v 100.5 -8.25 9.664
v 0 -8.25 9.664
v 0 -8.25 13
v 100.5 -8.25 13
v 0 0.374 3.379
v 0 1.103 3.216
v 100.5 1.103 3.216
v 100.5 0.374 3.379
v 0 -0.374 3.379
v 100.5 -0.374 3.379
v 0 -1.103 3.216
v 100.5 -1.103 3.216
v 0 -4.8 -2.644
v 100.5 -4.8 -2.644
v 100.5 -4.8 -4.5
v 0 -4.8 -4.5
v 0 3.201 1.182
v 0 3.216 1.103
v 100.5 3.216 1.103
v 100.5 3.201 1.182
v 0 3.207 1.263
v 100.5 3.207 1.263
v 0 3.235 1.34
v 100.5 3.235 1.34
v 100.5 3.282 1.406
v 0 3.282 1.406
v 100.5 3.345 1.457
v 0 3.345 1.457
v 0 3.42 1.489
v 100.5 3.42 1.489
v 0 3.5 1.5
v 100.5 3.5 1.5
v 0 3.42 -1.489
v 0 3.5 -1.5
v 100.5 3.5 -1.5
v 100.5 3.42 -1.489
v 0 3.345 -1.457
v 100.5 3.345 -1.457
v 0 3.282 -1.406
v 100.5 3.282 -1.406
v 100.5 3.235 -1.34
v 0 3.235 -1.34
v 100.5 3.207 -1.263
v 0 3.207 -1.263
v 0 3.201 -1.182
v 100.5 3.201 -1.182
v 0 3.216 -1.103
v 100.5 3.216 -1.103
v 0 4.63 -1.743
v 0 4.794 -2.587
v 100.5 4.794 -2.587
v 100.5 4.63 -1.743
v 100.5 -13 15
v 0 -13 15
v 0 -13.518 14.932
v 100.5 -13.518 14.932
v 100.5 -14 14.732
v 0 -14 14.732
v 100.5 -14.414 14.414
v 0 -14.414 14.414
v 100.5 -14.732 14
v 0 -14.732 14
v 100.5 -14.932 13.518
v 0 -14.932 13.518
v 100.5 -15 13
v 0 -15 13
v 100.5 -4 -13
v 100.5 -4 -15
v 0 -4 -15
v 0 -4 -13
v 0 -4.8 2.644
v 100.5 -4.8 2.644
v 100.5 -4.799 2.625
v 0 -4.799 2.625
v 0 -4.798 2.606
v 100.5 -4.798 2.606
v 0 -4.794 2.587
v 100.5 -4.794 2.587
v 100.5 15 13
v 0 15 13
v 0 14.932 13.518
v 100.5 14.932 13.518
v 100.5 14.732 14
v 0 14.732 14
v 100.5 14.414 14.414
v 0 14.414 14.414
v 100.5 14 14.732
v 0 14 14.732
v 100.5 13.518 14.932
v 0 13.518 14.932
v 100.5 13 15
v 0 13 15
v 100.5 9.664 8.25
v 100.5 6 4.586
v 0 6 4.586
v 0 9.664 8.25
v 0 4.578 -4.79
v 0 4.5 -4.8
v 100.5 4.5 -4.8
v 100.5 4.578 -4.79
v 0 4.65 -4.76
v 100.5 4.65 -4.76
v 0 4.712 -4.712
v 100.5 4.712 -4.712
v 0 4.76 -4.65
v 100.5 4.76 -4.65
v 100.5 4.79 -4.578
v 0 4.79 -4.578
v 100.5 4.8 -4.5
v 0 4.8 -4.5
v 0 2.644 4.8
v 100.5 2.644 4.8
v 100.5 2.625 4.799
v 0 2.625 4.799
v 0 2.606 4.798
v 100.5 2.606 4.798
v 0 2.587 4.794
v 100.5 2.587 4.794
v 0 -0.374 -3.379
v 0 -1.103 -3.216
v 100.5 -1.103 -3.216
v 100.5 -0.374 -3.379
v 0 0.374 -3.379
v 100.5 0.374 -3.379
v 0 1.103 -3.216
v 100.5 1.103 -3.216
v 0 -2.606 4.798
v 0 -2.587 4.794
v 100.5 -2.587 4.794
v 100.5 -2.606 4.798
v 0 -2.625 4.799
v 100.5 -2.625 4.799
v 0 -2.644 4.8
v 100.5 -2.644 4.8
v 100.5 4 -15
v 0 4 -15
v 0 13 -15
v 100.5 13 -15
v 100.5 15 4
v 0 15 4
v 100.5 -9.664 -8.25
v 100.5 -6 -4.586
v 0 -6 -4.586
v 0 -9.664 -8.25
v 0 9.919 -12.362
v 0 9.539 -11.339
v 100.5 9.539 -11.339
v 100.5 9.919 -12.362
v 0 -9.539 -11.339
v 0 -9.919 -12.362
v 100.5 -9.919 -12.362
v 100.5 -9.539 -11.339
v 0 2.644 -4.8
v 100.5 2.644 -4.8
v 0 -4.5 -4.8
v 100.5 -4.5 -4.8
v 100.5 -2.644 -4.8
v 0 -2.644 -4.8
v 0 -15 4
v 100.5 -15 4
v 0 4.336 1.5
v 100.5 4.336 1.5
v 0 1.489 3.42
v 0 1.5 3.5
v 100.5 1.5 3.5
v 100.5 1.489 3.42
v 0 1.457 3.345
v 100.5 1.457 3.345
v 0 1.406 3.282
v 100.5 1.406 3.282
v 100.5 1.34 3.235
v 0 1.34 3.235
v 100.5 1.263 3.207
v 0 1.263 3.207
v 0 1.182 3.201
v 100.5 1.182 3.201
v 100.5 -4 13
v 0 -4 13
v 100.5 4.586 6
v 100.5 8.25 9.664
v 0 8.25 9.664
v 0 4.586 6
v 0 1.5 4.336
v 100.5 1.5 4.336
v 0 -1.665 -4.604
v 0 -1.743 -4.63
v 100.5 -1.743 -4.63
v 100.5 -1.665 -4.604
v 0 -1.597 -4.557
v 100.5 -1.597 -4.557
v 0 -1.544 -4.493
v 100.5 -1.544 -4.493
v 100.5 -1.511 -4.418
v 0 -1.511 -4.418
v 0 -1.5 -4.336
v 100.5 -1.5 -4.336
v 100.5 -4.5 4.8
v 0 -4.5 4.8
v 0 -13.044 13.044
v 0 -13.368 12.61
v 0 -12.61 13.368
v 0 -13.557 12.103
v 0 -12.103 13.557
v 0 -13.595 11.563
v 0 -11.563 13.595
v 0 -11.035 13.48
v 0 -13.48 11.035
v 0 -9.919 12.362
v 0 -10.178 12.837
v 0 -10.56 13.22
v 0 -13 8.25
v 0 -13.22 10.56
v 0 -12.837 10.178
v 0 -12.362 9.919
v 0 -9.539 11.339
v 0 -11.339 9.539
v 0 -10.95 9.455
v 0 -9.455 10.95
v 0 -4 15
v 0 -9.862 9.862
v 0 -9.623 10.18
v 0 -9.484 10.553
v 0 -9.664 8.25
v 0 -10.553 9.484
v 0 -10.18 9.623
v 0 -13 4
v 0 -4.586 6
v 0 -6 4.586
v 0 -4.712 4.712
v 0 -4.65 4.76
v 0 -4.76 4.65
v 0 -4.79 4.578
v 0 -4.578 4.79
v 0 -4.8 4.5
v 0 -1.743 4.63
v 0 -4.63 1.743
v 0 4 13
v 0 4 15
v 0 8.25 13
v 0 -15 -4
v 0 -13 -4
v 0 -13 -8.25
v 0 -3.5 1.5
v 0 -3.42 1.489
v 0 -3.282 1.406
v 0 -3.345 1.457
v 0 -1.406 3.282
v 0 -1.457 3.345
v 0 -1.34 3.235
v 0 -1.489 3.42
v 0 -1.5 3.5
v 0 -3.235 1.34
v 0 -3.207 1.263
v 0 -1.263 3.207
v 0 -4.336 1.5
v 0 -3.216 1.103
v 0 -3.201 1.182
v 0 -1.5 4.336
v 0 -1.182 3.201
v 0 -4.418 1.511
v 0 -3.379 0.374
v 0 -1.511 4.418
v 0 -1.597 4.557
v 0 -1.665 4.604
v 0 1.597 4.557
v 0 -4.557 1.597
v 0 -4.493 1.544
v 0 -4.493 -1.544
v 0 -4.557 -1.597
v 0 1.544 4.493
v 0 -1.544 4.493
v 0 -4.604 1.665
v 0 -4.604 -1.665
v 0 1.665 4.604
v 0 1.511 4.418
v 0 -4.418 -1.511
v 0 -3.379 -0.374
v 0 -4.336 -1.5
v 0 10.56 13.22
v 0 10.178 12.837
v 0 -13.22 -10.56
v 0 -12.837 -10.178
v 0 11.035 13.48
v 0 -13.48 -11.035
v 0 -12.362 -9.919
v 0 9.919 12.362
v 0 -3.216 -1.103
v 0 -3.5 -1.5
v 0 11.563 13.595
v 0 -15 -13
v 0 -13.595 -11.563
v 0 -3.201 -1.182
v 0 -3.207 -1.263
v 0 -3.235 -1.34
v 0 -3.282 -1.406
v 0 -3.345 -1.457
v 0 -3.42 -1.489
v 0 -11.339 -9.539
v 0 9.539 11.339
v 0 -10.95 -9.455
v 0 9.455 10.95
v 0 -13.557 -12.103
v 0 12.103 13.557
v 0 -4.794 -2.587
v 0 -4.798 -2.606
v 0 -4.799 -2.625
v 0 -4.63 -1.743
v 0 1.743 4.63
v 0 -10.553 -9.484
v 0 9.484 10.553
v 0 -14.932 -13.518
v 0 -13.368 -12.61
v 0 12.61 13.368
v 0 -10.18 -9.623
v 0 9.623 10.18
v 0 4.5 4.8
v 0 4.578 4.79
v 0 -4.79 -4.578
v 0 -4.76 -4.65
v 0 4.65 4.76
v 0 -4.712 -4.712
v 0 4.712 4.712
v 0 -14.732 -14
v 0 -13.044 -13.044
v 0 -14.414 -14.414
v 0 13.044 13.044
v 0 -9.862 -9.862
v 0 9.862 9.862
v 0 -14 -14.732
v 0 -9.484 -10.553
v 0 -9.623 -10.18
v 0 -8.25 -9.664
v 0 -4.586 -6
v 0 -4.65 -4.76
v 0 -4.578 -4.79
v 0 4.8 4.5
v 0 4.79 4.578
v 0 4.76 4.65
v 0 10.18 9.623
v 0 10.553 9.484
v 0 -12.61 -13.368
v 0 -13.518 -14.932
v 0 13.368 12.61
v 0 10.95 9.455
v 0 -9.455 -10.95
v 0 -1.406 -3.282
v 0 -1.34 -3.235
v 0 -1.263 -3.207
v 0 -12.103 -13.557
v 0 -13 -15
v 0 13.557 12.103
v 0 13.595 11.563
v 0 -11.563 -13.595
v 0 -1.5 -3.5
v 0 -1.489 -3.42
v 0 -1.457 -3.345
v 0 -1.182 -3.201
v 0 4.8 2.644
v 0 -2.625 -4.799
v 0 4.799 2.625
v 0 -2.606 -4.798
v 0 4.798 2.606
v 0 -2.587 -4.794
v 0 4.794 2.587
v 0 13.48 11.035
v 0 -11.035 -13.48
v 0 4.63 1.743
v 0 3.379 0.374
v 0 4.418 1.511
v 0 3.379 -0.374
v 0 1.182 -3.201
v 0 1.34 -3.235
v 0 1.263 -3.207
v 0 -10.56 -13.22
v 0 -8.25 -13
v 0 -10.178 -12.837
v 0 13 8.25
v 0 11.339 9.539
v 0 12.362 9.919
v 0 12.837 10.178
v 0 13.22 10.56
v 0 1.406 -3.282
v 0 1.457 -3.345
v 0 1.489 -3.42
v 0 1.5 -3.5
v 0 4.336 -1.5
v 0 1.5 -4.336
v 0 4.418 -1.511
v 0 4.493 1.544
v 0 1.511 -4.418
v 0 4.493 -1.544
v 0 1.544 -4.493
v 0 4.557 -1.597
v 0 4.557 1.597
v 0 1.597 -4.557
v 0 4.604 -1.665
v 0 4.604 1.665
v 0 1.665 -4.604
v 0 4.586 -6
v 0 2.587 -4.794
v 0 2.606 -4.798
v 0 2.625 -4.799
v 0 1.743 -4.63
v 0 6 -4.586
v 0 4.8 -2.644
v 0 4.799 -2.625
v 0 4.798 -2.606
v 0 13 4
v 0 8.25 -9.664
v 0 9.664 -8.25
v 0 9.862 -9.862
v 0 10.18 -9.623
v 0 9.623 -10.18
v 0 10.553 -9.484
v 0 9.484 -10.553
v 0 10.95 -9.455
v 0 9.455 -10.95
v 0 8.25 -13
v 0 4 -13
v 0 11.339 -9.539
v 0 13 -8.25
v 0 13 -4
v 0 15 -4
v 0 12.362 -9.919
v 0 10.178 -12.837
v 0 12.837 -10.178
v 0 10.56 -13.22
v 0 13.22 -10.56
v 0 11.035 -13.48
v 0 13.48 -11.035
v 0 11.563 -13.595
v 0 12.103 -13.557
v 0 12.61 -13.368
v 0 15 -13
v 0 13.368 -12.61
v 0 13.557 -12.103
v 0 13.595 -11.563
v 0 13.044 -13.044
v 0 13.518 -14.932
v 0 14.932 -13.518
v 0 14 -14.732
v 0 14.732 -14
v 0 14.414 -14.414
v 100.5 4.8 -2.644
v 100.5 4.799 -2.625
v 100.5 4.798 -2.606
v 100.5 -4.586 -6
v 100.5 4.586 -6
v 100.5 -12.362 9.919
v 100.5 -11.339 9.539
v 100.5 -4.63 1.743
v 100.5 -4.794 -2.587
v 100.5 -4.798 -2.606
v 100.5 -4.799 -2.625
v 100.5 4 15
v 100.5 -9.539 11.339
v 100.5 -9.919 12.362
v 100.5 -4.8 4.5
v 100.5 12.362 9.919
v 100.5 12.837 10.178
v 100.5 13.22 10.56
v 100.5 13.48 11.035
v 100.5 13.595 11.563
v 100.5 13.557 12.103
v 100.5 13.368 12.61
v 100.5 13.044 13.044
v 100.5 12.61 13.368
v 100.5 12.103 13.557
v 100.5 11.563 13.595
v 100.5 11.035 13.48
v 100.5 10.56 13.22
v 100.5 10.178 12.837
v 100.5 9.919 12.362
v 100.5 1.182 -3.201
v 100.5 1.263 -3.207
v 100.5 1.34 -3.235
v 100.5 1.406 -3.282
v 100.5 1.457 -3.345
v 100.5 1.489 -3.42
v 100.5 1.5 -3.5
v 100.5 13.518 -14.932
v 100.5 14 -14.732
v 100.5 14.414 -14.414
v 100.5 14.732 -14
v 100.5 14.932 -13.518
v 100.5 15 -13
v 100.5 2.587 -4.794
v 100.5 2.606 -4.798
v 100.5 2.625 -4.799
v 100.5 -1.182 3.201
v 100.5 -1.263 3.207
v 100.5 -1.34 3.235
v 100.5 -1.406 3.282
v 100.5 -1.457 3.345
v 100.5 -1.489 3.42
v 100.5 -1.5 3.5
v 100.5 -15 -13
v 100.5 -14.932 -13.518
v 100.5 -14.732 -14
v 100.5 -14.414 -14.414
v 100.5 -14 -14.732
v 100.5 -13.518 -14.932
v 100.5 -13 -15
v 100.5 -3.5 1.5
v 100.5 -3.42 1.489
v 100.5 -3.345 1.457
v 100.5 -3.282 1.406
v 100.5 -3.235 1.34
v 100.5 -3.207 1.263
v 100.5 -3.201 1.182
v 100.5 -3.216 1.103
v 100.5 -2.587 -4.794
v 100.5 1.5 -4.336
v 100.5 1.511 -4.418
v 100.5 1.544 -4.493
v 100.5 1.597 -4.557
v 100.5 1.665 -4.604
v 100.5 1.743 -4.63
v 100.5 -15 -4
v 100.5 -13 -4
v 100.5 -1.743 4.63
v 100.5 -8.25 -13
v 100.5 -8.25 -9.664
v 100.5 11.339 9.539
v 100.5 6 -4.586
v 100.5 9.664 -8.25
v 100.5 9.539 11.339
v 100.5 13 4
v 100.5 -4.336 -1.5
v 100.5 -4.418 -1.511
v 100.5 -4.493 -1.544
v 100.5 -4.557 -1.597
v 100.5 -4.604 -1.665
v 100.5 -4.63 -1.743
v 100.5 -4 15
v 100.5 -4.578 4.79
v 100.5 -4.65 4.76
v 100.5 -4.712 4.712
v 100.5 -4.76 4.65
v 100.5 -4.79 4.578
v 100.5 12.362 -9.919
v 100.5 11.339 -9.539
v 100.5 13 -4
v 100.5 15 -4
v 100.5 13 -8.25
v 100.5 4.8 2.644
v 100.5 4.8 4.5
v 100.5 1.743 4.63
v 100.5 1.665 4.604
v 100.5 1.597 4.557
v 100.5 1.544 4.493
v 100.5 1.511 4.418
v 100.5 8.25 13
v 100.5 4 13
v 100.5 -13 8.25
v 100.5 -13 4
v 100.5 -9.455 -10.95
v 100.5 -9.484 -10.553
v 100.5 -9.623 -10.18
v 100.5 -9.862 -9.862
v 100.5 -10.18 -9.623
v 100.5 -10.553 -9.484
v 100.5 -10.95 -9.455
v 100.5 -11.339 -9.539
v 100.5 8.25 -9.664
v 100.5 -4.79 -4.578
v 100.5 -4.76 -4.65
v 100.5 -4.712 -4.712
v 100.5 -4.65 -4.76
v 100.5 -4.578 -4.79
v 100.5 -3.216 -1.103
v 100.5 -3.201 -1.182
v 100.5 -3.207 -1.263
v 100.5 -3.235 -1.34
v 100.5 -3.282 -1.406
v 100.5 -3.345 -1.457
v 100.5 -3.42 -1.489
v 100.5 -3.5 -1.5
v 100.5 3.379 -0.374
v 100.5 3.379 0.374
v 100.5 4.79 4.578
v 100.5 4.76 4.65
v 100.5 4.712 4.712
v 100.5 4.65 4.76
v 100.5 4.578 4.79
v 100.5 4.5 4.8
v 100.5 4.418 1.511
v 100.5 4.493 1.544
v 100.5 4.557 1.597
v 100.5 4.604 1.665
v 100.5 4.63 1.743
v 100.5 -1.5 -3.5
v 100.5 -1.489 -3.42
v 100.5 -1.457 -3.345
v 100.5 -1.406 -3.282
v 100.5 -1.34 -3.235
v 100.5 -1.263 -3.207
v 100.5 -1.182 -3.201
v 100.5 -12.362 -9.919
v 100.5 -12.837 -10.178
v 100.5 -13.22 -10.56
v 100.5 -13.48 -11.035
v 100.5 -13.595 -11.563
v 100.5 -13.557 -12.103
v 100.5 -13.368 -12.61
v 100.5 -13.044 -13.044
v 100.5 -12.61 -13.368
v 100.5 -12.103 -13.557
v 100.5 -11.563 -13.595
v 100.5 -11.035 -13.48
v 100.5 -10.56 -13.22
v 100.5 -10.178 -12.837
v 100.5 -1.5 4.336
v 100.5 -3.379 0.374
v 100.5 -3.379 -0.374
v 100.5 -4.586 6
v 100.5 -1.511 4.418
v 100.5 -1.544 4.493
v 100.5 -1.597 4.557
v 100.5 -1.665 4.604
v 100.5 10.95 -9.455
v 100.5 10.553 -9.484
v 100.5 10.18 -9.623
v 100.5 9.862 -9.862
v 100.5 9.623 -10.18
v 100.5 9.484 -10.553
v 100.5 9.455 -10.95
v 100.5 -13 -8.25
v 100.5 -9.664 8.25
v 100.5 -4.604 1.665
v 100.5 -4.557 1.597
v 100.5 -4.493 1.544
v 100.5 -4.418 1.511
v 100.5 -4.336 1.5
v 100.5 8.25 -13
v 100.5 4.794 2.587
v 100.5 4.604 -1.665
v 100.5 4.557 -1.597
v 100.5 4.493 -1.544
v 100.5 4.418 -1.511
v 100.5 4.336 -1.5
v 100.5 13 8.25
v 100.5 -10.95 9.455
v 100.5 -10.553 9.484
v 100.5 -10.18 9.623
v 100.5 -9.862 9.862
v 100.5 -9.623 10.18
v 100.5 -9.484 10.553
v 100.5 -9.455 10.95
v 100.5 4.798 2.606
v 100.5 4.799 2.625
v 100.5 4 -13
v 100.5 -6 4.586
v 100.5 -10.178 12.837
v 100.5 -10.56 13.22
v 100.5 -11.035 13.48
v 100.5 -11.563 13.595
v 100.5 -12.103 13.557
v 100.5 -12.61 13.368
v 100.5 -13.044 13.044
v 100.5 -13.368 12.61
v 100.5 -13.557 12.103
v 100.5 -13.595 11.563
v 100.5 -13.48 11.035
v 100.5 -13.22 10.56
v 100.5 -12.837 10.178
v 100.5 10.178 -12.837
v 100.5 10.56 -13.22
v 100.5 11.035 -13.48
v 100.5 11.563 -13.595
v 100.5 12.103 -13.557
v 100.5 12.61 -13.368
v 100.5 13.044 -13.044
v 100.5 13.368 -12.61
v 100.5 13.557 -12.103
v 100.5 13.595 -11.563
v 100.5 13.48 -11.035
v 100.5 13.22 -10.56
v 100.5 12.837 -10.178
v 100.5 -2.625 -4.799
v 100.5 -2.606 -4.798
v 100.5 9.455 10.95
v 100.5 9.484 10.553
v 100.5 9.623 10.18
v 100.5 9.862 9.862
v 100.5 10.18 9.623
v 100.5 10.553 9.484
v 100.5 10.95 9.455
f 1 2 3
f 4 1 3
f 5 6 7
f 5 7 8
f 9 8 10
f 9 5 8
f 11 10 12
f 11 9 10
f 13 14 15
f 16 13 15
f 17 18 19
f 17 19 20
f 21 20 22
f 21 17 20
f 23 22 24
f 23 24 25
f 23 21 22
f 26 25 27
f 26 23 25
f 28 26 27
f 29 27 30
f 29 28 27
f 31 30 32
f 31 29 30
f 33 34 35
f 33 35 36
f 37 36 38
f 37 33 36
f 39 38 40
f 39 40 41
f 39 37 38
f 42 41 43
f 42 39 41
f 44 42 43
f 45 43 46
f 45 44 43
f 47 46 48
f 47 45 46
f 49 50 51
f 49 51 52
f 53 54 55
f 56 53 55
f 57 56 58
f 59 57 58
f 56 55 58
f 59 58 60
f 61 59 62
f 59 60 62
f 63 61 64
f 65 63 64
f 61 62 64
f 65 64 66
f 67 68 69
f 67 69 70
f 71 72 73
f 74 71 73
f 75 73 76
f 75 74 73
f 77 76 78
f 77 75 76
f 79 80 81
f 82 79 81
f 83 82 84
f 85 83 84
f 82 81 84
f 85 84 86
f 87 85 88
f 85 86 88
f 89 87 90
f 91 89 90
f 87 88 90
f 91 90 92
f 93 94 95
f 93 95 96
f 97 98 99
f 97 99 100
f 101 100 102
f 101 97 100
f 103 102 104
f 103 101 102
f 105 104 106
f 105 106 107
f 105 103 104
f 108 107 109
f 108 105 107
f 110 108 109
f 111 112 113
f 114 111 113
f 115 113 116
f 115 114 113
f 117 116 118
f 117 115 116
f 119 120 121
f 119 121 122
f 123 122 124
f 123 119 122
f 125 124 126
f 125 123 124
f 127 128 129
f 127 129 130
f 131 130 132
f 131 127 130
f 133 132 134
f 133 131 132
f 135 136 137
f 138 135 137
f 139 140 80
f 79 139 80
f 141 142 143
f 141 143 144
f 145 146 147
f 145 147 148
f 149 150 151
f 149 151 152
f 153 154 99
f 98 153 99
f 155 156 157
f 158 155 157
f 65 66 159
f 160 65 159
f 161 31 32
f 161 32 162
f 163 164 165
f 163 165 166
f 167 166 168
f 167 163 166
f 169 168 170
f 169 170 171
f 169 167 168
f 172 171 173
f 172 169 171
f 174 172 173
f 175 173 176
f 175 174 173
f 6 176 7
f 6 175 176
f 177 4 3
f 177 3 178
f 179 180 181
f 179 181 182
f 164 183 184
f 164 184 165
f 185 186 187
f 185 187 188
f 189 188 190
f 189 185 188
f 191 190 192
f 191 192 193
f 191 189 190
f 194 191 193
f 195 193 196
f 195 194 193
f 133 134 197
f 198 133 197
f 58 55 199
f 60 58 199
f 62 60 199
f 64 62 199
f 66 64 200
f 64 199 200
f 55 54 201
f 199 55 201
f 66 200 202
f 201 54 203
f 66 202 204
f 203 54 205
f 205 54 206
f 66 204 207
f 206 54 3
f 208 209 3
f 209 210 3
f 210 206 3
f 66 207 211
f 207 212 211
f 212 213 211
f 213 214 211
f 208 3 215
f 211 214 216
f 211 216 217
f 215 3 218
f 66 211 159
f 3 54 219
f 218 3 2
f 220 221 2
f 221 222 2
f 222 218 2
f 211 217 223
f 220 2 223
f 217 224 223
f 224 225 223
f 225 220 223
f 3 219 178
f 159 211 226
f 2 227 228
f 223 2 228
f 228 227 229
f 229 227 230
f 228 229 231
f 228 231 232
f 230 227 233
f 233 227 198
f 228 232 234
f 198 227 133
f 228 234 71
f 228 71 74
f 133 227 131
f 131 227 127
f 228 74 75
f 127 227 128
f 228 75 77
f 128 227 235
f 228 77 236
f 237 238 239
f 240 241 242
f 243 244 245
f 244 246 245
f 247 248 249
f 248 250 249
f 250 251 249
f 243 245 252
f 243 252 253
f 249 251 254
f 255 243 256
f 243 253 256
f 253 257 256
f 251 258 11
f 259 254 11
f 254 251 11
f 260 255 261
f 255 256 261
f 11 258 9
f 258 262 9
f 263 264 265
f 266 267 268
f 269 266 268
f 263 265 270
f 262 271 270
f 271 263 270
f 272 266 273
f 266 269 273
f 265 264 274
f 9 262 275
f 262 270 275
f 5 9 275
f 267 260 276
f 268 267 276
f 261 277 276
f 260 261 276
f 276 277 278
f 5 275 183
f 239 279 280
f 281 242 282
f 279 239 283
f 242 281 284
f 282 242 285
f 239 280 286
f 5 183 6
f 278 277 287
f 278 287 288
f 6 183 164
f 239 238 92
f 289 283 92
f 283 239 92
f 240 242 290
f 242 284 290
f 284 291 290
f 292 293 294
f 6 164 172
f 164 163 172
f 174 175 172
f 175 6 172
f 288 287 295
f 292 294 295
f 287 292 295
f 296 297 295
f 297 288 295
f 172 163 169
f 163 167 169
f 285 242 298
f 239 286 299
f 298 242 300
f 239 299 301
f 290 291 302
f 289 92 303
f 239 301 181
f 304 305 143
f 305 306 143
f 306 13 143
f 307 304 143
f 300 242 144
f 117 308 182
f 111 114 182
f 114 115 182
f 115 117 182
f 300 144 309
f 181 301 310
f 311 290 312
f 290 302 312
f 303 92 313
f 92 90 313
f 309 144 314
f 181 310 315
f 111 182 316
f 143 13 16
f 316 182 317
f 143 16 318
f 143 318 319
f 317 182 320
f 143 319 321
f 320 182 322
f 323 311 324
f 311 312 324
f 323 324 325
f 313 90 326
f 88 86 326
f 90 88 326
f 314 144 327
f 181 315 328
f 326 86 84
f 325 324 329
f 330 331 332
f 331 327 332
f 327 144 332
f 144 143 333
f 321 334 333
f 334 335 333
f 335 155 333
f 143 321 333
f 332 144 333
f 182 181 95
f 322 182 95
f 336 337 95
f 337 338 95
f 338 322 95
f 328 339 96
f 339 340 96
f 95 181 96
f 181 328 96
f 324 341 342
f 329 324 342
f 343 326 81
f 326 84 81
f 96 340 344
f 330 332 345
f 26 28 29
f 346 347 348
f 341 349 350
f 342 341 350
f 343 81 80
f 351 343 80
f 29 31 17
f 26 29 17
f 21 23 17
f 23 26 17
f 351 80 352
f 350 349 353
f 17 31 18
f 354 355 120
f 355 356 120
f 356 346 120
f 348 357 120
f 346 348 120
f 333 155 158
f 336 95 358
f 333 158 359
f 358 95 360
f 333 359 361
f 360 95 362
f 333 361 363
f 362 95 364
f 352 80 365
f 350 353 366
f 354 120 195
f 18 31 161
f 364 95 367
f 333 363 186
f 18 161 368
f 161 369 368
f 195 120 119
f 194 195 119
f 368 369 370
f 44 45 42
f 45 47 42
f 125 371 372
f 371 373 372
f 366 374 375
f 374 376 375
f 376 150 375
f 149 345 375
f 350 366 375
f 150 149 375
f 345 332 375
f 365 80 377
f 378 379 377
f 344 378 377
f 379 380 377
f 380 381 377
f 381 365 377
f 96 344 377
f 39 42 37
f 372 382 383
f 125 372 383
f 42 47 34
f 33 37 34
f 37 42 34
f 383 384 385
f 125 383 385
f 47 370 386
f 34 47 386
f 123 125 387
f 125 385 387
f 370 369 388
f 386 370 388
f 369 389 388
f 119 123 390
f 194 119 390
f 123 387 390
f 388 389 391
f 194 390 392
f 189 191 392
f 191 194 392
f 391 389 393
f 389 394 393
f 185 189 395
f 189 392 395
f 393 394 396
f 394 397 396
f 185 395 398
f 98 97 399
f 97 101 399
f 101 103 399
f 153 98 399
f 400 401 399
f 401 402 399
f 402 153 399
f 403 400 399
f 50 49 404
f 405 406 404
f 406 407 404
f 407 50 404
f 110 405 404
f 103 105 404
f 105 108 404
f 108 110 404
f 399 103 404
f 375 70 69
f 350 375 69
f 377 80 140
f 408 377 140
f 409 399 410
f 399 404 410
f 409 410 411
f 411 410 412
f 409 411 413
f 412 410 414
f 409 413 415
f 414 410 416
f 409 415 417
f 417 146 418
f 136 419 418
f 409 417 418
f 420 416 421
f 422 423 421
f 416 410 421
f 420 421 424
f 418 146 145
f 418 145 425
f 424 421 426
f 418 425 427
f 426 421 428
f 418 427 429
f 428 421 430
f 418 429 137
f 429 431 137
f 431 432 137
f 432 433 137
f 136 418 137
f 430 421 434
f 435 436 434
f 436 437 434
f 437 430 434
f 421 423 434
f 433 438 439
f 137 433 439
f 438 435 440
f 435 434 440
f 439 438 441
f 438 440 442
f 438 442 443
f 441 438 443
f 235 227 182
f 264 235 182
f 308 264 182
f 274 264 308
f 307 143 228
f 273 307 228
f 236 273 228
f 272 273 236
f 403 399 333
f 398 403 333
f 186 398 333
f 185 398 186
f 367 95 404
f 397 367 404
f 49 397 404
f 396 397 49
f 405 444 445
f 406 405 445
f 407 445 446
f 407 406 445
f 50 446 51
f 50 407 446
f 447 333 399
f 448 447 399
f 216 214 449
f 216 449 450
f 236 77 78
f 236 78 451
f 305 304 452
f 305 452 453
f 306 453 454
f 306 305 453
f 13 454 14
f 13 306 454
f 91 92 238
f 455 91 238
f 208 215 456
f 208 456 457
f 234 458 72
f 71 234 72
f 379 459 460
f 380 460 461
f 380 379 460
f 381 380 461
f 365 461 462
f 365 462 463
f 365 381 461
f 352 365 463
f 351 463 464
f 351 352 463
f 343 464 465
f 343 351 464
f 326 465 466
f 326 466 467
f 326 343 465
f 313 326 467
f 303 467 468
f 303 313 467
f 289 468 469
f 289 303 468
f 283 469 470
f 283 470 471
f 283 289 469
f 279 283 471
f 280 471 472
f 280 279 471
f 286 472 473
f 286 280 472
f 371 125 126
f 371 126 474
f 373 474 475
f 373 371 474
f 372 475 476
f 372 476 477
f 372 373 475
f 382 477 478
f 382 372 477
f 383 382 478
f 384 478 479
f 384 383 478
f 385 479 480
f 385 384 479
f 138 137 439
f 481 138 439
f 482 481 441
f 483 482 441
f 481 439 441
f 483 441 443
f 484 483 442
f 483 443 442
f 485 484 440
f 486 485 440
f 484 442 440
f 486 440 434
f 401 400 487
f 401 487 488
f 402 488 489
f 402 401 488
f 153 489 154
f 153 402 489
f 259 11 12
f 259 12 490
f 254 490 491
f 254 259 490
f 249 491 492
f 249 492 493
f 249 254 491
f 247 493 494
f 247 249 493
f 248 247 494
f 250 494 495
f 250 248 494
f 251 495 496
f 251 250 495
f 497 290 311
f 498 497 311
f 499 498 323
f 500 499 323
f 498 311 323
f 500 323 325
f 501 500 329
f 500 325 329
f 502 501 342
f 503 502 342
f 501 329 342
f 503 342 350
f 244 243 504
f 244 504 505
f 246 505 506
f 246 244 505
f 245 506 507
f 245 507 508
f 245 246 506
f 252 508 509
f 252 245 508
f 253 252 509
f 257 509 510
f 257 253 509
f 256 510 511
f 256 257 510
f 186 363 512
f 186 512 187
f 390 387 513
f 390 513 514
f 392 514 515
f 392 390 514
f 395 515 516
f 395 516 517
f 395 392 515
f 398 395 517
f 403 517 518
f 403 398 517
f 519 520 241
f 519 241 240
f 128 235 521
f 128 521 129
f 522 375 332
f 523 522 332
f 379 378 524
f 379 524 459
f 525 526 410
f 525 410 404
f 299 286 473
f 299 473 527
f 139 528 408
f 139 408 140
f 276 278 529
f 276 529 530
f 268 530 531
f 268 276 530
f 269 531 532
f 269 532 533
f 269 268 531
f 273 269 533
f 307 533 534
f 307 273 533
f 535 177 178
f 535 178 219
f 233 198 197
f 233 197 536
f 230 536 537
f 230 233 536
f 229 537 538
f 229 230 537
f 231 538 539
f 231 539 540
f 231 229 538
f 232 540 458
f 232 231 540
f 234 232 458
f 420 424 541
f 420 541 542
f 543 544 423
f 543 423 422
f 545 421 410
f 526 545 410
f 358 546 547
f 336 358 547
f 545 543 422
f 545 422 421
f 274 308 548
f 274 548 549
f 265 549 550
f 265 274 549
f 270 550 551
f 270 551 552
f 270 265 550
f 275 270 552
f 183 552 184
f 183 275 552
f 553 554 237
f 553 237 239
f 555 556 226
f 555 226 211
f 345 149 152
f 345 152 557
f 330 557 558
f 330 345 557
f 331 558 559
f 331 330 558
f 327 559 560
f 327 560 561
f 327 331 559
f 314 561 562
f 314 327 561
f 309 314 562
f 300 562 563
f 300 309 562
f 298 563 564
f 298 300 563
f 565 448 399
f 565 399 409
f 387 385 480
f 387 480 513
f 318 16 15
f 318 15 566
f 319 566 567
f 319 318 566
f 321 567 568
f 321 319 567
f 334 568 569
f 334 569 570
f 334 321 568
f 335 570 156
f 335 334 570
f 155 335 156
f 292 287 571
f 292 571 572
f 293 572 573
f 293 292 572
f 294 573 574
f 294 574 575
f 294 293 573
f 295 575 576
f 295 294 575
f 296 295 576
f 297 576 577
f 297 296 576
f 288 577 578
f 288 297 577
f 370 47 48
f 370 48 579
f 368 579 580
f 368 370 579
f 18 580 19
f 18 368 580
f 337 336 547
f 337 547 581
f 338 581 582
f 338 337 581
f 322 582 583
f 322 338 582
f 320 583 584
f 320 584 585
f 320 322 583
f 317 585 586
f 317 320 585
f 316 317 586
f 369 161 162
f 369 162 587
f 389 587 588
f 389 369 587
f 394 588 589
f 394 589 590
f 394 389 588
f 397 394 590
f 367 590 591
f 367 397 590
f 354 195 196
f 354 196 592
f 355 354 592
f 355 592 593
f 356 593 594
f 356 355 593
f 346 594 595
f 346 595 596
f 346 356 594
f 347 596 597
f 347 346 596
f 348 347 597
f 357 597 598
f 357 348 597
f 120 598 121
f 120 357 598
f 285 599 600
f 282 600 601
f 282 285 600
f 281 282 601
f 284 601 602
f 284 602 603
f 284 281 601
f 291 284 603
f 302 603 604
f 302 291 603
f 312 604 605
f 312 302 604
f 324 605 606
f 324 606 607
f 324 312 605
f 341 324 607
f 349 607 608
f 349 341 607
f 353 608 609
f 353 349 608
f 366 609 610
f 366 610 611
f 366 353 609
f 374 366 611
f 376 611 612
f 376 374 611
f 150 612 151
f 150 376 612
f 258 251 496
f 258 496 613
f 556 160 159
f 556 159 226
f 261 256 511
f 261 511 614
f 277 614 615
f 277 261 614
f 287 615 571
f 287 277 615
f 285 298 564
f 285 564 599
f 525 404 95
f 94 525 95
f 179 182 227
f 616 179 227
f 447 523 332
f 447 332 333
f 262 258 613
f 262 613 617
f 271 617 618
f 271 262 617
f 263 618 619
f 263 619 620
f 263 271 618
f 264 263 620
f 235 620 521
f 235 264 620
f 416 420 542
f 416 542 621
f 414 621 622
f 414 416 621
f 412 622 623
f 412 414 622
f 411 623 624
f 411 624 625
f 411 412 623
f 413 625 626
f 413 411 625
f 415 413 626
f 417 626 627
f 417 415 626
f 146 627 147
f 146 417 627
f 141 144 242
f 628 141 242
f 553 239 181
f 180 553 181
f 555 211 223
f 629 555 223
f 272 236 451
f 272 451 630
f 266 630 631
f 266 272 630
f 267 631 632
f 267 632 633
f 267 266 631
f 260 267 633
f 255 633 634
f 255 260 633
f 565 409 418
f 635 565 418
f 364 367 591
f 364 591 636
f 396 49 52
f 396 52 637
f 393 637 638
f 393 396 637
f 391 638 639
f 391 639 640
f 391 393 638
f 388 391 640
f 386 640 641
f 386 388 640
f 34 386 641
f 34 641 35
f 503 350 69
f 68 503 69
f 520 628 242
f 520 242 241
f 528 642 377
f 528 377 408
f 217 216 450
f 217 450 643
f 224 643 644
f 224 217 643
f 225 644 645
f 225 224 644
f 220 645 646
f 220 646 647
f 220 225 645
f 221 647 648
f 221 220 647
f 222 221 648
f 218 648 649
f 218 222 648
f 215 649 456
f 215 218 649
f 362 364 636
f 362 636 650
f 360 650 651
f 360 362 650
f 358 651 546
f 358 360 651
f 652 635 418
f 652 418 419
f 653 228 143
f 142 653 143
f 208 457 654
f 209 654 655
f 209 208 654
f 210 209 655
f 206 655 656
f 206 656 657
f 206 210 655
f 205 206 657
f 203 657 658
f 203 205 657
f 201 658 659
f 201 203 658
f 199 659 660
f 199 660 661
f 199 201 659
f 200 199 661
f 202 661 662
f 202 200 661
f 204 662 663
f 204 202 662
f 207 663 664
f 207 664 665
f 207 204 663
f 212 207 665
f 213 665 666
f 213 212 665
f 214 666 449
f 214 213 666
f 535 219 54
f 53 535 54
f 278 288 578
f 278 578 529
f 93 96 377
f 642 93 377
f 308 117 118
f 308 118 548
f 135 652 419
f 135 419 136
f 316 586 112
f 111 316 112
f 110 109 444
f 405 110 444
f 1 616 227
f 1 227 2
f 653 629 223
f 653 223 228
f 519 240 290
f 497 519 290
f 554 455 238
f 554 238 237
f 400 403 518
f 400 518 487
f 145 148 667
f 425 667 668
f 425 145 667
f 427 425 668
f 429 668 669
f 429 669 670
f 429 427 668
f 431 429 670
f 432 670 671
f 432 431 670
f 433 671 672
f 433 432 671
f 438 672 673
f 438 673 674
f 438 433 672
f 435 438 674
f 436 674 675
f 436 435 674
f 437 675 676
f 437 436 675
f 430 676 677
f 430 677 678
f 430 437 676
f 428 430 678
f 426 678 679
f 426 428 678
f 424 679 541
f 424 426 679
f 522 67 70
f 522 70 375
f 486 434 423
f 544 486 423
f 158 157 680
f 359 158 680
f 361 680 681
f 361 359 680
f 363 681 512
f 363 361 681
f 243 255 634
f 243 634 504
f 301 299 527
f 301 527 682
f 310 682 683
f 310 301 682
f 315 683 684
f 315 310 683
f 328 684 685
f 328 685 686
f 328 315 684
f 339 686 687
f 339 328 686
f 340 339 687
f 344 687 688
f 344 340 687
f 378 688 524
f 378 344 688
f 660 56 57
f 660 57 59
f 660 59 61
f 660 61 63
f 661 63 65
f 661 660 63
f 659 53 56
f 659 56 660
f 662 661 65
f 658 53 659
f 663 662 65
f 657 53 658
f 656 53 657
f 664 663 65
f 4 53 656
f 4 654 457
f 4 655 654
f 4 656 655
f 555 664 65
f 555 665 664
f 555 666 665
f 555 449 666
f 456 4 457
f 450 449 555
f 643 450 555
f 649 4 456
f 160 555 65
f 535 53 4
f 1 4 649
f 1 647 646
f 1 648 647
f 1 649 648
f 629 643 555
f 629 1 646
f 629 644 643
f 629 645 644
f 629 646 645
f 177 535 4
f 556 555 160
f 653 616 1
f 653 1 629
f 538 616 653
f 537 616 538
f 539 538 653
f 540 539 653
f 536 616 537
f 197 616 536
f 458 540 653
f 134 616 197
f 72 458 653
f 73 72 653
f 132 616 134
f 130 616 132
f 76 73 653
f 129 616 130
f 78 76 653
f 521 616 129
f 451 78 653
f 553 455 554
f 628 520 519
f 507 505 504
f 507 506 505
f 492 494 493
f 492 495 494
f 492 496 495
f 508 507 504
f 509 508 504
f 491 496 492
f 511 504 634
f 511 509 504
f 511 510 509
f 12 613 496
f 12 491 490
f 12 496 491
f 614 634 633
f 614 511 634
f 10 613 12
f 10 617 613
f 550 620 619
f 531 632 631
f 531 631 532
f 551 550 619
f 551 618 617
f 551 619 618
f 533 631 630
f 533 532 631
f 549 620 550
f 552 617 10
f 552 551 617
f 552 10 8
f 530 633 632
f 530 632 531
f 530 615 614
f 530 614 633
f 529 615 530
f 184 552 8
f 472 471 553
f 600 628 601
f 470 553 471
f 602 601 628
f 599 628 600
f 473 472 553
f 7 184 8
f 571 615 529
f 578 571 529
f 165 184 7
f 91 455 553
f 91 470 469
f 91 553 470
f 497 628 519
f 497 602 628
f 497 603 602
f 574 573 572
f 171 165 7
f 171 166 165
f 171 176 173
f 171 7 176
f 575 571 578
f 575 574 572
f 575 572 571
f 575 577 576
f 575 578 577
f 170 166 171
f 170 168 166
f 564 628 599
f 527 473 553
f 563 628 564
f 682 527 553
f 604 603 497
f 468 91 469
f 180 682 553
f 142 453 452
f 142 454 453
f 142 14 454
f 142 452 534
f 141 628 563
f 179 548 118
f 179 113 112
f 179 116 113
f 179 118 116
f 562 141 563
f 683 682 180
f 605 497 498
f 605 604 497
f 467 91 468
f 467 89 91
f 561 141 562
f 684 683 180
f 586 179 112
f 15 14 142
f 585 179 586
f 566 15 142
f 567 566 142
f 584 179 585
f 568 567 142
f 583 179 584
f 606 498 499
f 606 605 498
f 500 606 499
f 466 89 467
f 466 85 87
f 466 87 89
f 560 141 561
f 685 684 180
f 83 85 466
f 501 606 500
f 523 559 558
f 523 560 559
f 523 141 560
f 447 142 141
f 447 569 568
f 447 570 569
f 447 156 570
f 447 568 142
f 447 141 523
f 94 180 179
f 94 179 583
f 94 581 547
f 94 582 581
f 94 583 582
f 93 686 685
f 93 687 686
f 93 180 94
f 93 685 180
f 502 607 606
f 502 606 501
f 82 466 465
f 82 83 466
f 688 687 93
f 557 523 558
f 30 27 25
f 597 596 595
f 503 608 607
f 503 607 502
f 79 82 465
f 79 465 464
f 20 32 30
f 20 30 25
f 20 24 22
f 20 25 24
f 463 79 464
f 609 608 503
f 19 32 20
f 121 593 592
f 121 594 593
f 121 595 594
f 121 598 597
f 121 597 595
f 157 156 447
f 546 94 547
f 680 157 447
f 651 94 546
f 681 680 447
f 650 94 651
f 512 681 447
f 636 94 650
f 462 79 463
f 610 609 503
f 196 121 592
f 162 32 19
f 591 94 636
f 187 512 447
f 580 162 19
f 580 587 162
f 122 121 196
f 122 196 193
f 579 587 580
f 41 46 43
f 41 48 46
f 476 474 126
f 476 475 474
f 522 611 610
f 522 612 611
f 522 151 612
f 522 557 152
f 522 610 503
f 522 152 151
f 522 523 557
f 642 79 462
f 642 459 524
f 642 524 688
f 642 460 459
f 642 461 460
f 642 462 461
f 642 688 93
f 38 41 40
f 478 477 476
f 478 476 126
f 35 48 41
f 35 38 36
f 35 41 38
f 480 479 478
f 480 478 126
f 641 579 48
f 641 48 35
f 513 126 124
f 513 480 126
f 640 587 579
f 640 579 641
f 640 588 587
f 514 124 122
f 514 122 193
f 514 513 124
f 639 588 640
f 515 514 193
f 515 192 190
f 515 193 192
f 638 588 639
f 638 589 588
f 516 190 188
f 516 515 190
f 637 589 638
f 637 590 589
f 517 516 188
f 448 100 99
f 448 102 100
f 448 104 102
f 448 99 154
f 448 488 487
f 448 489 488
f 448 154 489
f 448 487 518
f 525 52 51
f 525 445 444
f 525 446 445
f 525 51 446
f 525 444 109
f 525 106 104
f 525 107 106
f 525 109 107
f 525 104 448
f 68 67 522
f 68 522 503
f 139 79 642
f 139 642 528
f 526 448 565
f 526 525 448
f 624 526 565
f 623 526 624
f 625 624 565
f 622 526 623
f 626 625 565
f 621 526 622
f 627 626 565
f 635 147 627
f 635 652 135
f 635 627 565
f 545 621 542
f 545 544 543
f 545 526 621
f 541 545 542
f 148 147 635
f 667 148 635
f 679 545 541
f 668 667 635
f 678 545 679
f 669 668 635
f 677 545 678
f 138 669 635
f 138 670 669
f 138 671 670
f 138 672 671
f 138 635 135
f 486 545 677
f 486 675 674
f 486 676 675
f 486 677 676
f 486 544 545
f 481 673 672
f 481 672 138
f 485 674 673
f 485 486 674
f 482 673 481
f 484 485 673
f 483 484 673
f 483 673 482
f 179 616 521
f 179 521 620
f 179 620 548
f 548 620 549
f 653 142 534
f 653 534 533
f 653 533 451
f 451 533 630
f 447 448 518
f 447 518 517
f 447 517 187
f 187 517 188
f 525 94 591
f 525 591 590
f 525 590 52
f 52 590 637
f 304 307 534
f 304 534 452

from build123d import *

# Parameters (mm, degrees)
BOSS_EXTRUDE1_DEPTH = 100.5


with BuildPart() as part:
    # Sketch1 → Boss-Extrude1 (new body)
    with BuildSketch(Plane(origin=(0, 0, 0), x_dir=(0, 0, -1), z_dir=(1, 0, 0))):
        with BuildLine():
            Line((-15, 13), (-15, 4))
            Line((-15, 4), (-13, 4))
            Line((-13, 4), (-13, 8.25))
            Line((-13, 8.25), (-9.664213562, 8.25))
            Line((-9.664213562, 8.25), (-6, 4.585786438))
            Line((-6, 4.585786438), (-6, -4.585786438))
            Line((-6, -4.585786438), (-9.664213562, -8.25))
            Line((-9.664213562, -8.25), (-13, -8.25))
            Line((-13, -8.25), (-13, -4))
            Line((-13, -4), (-15, -4))
            Line((-15, -4), (-15, -13))
            ThreePointArc((-15, -13), (-14.414213562, -14.414213562), (-13, -15))
            Line((-13, -15), (-4, -15))
            Line((-4, -15), (-4, -13))
            Line((-4, -13), (-8.25, -13))
            Line((-8.25, -13), (-8.25, -9.664213562))
            Line((-8.25, -9.664213562), (-4.585786438, -6))
            Line((-4.585786438, -6), (4.585786438, -6))
            Line((4.585786438, -6), (8.25, -9.664213562))
            Line((8.25, -9.664213562), (8.25, -13))
            Line((8.25, -13), (4, -13))
            Line((4, -13), (4, -15))
            Line((4, -15), (13, -15))
            ThreePointArc((13, -15), (14.414213562, -14.414213562), (15, -13))
            Line((15, -13), (15, -4))
            Line((15, -4), (13, -4))
            Line((13, -4), (13, -8.25))
            Line((13, -8.25), (9.664213562, -8.25))
            Line((9.664213562, -8.25), (6, -4.585786438))
            Line((6, -4.585786438), (6, 4.585786438))
            Line((6, 4.585786438), (9.664213562, 8.25))
            Line((9.664213562, 8.25), (13, 8.25))
            Line((13, 8.25), (13, 4))
            Line((13, 4), (15, 4))
            Line((15, 4), (15, 13))
            ThreePointArc((15, 13), (14.414213562, 14.414213562), (13, 15))
            Line((13, 15), (4, 15))
            Line((4, 15), (4, 13))
            Line((4, 13), (8.25, 13))
            Line((8.25, 13), (8.25, 9.664213562))
            Line((8.25, 9.664213562), (4.585786438, 6))
            Line((4.585786438, 6), (-4.585786438, 6))
            Line((-4.585786438, 6), (-8.25, 9.664213562))
            Line((-8.25, 9.664213562), (-8.25, 13))
            Line((-8.25, 13), (-4, 13))
            Line((-4, 13), (-4, 15))
            Line((-4, 15), (-13, 15))
            ThreePointArc((-13, 15), (-14.414213562, 14.414213562), (-15, 13))
        make_face()
        with BuildLine():
            Line((-9.539070071, 11.338915743), (-9.918883282, 12.361530981))
            ThreePointArc((-9.918883282, 12.361530981), (-13.043502884, 13.043502884), (-12.361530981, 9.918883282))
            Line((-12.361530981, 9.918883282), (-11.338915743, 9.539070071))
            ThreePointArc((-11.338915743, 9.539070071), (-9.861522369, 9.861522369), (-9.539070071, 11.338915743))
        make_face(mode=Mode.SUBTRACT)
        with BuildLine():
            Line((9.918883282, 12.361530981), (9.539070071, 11.338915743))
            ThreePointArc((9.539070071, 11.338915743), (9.861522369, 9.861522369), (11.338915743, 9.539070071))
            Line((11.338915743, 9.539070071), (12.361530981, 9.918883282))
            ThreePointArc((12.361530981, 9.918883282), (13.043502884, 13.043502884), (9.918883282, 12.361530981))
        make_face(mode=Mode.SUBTRACT)
        with BuildLine():
            Line((12.361530981, -9.918883282), (11.338915743, -9.539070071))
            ThreePointArc((11.338915743, -9.539070071), (9.861522369, -9.861522369), (9.539070071, -11.338915743))
            Line((9.539070071, -11.338915743), (9.918883282, -12.361530981))
            ThreePointArc((9.918883282, -12.361530981), (13.043502884, -13.043502884), (12.361530981, -9.918883282))
        make_face(mode=Mode.SUBTRACT)
        with BuildLine():
            Line((-11.338915743, -9.539070071), (-12.361530981, -9.918883282))
            ThreePointArc((-12.361530981, -9.918883282), (-13.043502884, -13.043502884), (-9.918883282, -12.361530981))
            Line((-9.918883282, -12.361530981), (-9.539070071, -11.338915743))
            ThreePointArc((-9.539070071, -11.338915743), (-9.861522369, -9.861522369), (-11.338915743, -9.539070071))
        make_face(mode=Mode.SUBTRACT)
        with BuildLine():
            Line((-4.8, -2.644433572), (-4.8, -4.5))
            ThreePointArc((-4.8, -4.5), (-4.712132034, -4.712132034), (-4.5, -4.8))
            Line((-4.5, -4.8), (-2.644433572, -4.8))
            ThreePointArc((-2.644433572, -4.8), (-2.615679847, -4.79861886), (-2.587190874, -4.794488155))
            Line((-2.587190874, -4.794488155), (-1.742757301, -4.630346896))
            ThreePointArc((-1.742757301, -4.630346896), (-1.568512625, -4.526682207), (-1.5, -4.335858741))
            Line((-1.5, -4.335858741), (-1.5, -3.5))
            ThreePointArc((-1.5, -3.5), (-1.374371458, -3.255879959), (-1.102702703, -3.216216216))
            ThreePointArc((-1.102702703, -3.216216216), (0, -3.4), (1.102702703, -3.216216216))
            ThreePointArc((1.102702703, -3.216216216), (1.374371458, -3.255879959), (1.5, -3.5))
            Line((1.5, -3.5), (1.5, -4.335858741))
            ThreePointArc((1.5, -4.335858741), (1.568512625, -4.526682207), (1.742757301, -4.630346896))
            Line((1.742757301, -4.630346896), (2.587190874, -4.794488155))
            ThreePointArc((2.587190874, -4.794488155), (2.615679847, -4.79861886), (2.644433572, -4.8))
            Line((2.644433572, -4.8), (4.5, -4.8))
            ThreePointArc((4.5, -4.8), (4.712132034, -4.712132034), (4.8, -4.5))
            Line((4.8, -4.5), (4.8, -2.644433572))
            ThreePointArc((4.8, -2.644433572), (4.79861886, -2.615679847), (4.794488155, -2.587190874))
            Line((4.794488155, -2.587190874), (4.630346896, -1.742757301))
            ThreePointArc((4.630346896, -1.742757301), (4.526682207, -1.568512625), (4.335858741, -1.5))
            Line((4.335858741, -1.5), (3.5, -1.5))
            ThreePointArc((3.5, -1.5), (3.255879959, -1.374371458), (3.216216216, -1.102702703))
            ThreePointArc((3.216216216, -1.102702703), (3.4, 0), (3.216216216, 1.102702703))
            ThreePointArc((3.216216216, 1.102702703), (3.255879959, 1.374371458), (3.5, 1.5))
            Line((3.5, 1.5), (4.335858741, 1.5))
            ThreePointArc((4.335858741, 1.5), (4.526682207, 1.568512625), (4.630346896, 1.742757301))
            Line((4.630346896, 1.742757301), (4.794488155, 2.587190874))
            ThreePointArc((4.794488155, 2.587190874), (4.79861886, 2.615679847), (4.8, 2.644433572))
            Line((4.8, 2.644433572), (4.8, 4.5))
            ThreePointArc((4.8, 4.5), (4.712132034, 4.712132034), (4.5, 4.8))
            Line((4.5, 4.8), (2.644433572, 4.8))
            ThreePointArc((2.644433572, 4.8), (2.615679847, 4.79861886), (2.587190874, 4.794488155))
            Line((2.587190874, 4.794488155), (1.742757301, 4.630346896))
            ThreePointArc((1.742757301, 4.630346896), (1.568512625, 4.526682207), (1.5, 4.335858741))
            Line((1.5, 4.335858741), (1.5, 3.5))
            ThreePointArc((1.5, 3.5), (1.374371458, 3.255879959), (1.102702703, 3.216216216))
            ThreePointArc((1.102702703, 3.216216216), (0, 3.4), (-1.102702703, 3.216216216))
            ThreePointArc((-1.102702703, 3.216216216), (-1.374371458, 3.255879959), (-1.5, 3.5))
            Line((-1.5, 3.5), (-1.5, 4.335858741))
            ThreePointArc((-1.5, 4.335858741), (-1.568512625, 4.526682207), (-1.742757301, 4.630346896))
            Line((-1.742757301, 4.630346896), (-2.587190874, 4.794488155))
            ThreePointArc((-2.587190874, 4.794488155), (-2.615679847, 4.79861886), (-2.644433572, 4.8))
            Line((-2.644433572, 4.8), (-4.5, 4.8))
            ThreePointArc((-4.5, 4.8), (-4.712132034, 4.712132034), (-4.8, 4.5))
            Line((-4.8, 4.5), (-4.8, 2.644433572))
            ThreePointArc((-4.8, 2.644433572), (-4.79861886, 2.615679847), (-4.794488155, 2.587190874))
            Line((-4.794488155, 2.587190874), (-4.630346896, 1.742757301))
            ThreePointArc((-4.630346896, 1.742757301), (-4.526682207, 1.568512625), (-4.335858741, 1.5))
            Line((-4.335858741, 1.5), (-3.5, 1.5))
            ThreePointArc((-3.5, 1.5), (-3.255879959, 1.374371458), (-3.216216216, 1.102702703))
            ThreePointArc((-3.216216216, 1.102702703), (-3.4, 0), (-3.216216216, -1.102702703))
            ThreePointArc((-3.216216216, -1.102702703), (-3.255879959, -1.374371458), (-3.5, -1.5))
            Line((-3.5, -1.5), (-4.335858741, -1.5))
            ThreePointArc((-4.335858741, -1.5), (-4.526682207, -1.568512625), (-4.630346896, -1.742757301))
            Line((-4.630346896, -1.742757301), (-4.794488155, -2.587190874))
            ThreePointArc((-4.794488155, -2.587190874), (-4.79861886, -2.615679847), (-4.8, -2.644433572))
        make_face(mode=Mode.SUBTRACT)
    extrude(amount=BOSS_EXTRUDE1_DEPTH)


solid = part.part
